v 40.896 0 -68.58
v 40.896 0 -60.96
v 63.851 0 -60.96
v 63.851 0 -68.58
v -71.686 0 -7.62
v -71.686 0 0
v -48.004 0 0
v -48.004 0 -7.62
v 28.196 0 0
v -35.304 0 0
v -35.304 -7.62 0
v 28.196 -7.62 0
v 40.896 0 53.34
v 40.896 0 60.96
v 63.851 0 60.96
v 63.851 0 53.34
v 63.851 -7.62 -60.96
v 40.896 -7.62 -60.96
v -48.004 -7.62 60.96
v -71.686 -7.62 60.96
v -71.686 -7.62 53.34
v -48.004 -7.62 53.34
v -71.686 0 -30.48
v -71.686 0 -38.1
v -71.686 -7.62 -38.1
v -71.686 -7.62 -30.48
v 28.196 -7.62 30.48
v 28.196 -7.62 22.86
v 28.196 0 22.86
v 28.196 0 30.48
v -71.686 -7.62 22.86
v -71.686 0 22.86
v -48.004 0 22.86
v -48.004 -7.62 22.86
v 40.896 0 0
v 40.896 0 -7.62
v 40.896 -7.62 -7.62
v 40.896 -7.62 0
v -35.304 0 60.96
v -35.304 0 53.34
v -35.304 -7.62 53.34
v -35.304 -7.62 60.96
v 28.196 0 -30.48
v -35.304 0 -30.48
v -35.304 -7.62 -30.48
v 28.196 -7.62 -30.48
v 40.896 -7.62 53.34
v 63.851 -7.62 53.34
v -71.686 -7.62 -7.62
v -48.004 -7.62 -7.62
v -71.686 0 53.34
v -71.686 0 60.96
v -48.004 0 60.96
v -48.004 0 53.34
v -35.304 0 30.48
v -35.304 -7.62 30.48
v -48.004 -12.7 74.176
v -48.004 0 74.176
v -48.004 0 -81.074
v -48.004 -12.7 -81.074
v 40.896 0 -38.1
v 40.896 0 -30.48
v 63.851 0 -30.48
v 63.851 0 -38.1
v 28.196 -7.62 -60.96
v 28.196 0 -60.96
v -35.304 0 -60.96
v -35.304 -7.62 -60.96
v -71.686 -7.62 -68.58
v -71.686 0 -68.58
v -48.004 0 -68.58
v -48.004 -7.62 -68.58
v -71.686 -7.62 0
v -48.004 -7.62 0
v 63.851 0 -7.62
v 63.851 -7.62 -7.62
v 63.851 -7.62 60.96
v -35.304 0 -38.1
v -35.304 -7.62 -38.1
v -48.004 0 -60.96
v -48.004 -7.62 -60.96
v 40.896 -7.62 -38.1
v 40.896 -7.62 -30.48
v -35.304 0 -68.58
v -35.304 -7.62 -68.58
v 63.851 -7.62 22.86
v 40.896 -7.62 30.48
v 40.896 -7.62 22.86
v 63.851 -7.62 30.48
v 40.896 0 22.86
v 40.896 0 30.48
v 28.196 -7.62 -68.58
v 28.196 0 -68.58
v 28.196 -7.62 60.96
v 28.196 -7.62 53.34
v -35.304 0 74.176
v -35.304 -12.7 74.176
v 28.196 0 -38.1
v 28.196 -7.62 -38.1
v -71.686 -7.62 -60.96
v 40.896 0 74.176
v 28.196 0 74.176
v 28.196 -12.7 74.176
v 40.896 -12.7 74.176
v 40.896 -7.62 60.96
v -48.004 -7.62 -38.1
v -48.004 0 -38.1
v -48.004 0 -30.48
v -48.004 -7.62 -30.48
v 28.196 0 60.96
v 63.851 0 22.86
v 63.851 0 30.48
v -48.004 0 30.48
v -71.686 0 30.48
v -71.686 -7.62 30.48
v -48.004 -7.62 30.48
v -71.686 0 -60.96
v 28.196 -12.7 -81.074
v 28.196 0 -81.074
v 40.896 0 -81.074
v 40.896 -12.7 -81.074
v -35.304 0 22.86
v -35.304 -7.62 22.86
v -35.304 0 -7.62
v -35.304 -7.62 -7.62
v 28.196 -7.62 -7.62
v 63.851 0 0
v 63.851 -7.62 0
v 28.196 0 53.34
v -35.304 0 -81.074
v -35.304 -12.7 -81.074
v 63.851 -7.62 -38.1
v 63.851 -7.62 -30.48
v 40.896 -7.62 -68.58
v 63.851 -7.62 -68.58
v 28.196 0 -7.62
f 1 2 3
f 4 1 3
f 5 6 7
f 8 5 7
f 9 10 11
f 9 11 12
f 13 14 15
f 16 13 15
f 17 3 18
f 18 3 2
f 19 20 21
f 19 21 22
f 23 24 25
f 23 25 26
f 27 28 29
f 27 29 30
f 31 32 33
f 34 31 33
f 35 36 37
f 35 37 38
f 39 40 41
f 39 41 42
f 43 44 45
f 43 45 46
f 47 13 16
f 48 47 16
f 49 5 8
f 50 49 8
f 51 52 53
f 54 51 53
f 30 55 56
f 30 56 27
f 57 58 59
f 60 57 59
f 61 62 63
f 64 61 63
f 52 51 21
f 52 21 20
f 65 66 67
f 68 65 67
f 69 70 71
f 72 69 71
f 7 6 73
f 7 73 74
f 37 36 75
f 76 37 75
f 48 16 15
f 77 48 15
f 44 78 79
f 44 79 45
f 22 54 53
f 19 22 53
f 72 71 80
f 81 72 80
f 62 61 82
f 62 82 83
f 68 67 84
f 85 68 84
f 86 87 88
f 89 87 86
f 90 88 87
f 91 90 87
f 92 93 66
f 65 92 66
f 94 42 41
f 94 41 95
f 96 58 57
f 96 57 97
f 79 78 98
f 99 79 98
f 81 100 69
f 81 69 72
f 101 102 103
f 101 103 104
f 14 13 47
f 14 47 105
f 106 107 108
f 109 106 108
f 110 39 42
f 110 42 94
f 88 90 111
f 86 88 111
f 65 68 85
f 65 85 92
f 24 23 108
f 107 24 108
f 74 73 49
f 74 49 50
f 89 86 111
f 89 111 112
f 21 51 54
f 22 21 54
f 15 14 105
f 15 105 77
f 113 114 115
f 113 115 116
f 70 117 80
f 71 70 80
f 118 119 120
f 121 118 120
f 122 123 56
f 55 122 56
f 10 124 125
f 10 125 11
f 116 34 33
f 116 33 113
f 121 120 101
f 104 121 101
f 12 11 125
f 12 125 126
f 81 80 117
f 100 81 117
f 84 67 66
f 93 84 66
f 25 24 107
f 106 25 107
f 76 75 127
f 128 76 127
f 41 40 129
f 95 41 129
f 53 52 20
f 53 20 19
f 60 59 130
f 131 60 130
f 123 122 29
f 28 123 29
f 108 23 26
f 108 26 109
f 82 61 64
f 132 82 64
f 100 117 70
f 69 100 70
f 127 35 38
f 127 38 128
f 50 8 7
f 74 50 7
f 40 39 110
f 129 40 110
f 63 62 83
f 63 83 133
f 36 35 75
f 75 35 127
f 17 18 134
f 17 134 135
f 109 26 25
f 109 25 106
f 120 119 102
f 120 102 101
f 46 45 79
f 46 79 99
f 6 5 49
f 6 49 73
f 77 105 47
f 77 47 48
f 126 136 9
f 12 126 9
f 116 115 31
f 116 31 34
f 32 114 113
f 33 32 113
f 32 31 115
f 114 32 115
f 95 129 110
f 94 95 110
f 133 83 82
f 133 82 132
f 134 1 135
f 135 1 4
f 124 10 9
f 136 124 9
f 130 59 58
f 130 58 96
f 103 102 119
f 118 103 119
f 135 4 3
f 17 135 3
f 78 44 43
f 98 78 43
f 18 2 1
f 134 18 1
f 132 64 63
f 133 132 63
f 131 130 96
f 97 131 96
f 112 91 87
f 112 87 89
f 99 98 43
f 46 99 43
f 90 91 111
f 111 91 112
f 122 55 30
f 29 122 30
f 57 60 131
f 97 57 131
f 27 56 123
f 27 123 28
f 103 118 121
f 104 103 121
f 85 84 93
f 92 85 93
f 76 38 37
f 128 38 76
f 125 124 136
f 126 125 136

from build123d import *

# Parameters (mm, degrees)
F0_W     = 12.7
F0_H     = 13.215657315
F0_H_2   = 22.86
F0_H_3   = 12.4944613409
F0_H_4   = 7.62
F1_DEPTH = 12.7
F0_W_2   = 23.6822664738
F2_DEPTH = 7.62
F0_W_3   = 63.5
F0_W_4   = 22.954866147


with BuildPart() as f1:
    # F0 (on Front) → F1 (new body)
    with BuildSketch(Plane.XZ):
        with Locations((-41.6535617948, 67.5678286575)):
            Rectangle(F0_W, F0_H)
        with Locations((-41.6535617948, 41.91)):
            Rectangle(F0_W, F0_H_2)
        with Locations((-41.6535617948, 11.43)):
            Rectangle(F0_W, F0_H_2)
        with Locations((-41.6535617948, -19.05)):
            Rectangle(F0_W, F0_H_2)
        with Locations((-41.6535617948, -49.53)):
            Rectangle(F0_W, F0_H_2)
        with Locations((-41.6535617948, -74.8272306705)):
            Rectangle(F0_W, F0_H_3)
        with Locations((-41.6535617948, 57.15)):
            Rectangle(F0_W, F0_H_4)
        Polygon((-35.3035617948, -68.58), (-35.3035617948, -67.4191057513), (-35.3035617948, -60.96), (-48.0035617948, -60.96), (-48.0035617948, -67.4191057513), (-48.0035617948, -68.58), align=None)
        with Locations((-41.6535617948, -34.29)):
            Rectangle(F0_W, F0_H_4)
        with Locations((-41.6535617948, -3.81)):
            Rectangle(F0_W, F0_H_4)
        with Locations((-41.6535617948, 26.67)):
            Rectangle(F0_W, F0_H_4)
    extrude(amount=F1_DEPTH)


with BuildPart() as f1b:
    # F0 (on Front) → F1, piece 2 (new body)
    with BuildSketch(Plane.XZ):
        with Locations((34.5464382052, 67.5678286575)):
            Rectangle(F0_W, F0_H)
        with Locations((34.5464382052, 41.91)):
            Rectangle(F0_W, F0_H_2)
        with Locations((34.5464382052, 11.43)):
            Rectangle(F0_W, F0_H_2)
        with Locations((34.5464382052, -19.05)):
            Rectangle(F0_W, F0_H_2)
        with Locations((34.5464382052, -49.53)):
            Rectangle(F0_W, F0_H_2)
        with Locations((34.5464382052, -74.8272306705)):
            Rectangle(F0_W, F0_H_3)
        with Locations((34.5464382052, 57.15)):
            Rectangle(F0_W, F0_H_4)
        with Locations((34.5464382052, 26.67)):
            Rectangle(F0_W, F0_H_4)
        with Locations((34.5464382052, -3.81)):
            Rectangle(F0_W, F0_H_4)
        with Locations((34.5464382052, -34.29)):
            Rectangle(F0_W, F0_H_4)
        Polygon((40.8964382052, -60.96), (28.1964382052, -60.96), (28.1964382052, -67.4191057513), (28.1964382052, -68.58), (40.8964382052, -68.58), (40.8964382052, -67.4191057513), align=None)
    extrude(amount=F1_DEPTH)


with BuildPart() as f2:
    # F0 (on Front) → F2 (new body)
    with BuildSketch(Plane.XZ):
        with Locations((-59.8446950316, 57.15)):
            Rectangle(F0_W_2, F0_H_4)
    extrude(amount=F2_DEPTH)


with BuildPart() as f2b:
    # F0 (on Front) → F2, piece 2 (new body)
    with BuildSketch(Plane.XZ):
        with Locations((-3.5535617948, 57.15)):
            Rectangle(F0_W_3, F0_H_4)
    extrude(amount=F2_DEPTH)


with BuildPart() as f2c:
    # F0 (on Front) → F2, piece 3 (new body)
    with BuildSketch(Plane.XZ):
        with Locations((-59.8446950316, 26.67)):
            Rectangle(F0_W_2, F0_H_4)
    extrude(amount=F2_DEPTH)


with BuildPart() as f2d:
    # F0 (on Front) → F2, piece 4 (new body)
    with BuildSketch(Plane.XZ):
        with Locations((-3.5535617948, 26.67)):
            Rectangle(F0_W_3, F0_H_4)
    extrude(amount=F2_DEPTH)


with BuildPart() as f2e:
    # F0 (on Front) → F2, piece 5 (new body)
    with BuildSketch(Plane.XZ):
        with Locations((-59.8446950316, -3.81)):
            Rectangle(F0_W_2, F0_H_4)
    extrude(amount=F2_DEPTH)


with BuildPart() as f2f:
    # F0 (on Front) → F2, piece 6 (new body)
    with BuildSketch(Plane.XZ):
        with Locations((-3.5535617948, -3.81)):
            Rectangle(F0_W_3, F0_H_4)
    extrude(amount=F2_DEPTH)


with BuildPart() as f2g:
    # F0 (on Front) → F2, piece 7 (new body)
    with BuildSketch(Plane.XZ):
        with Locations((-59.8446950316, -34.29)):
            Rectangle(F0_W_2, F0_H_4)
    extrude(amount=F2_DEPTH)


with BuildPart() as f2h:
    # F0 (on Front) → F2, piece 8 (new body)
    with BuildSketch(Plane.XZ):
        with Locations((-3.5535617948, -34.29)):
            Rectangle(F0_W_3, F0_H_4)
    extrude(amount=F2_DEPTH)


with BuildPart() as f2i:
    # F0 (on Front) → F2, piece 9 (new body)
    with BuildSketch(Plane.XZ):
        Polygon((-48.0035617948, -67.4191057513), (-48.0035617948, -60.96), (-71.6858282685, -60.96), (-71.6858282685, -68.58), (-48.0035617948, -68.58), align=None)
    extrude(amount=F2_DEPTH)


with BuildPart() as f2j:
    # F0 (on Front) → F2, piece 10 (new body)
    with BuildSketch(Plane.XZ):
        Polygon((-35.3035617948, -60.96), (-35.3035617948, -67.4191057513), (-35.3035617948, -68.58), (28.1964382052, -68.58), (28.1964382052, -67.4191057513), (28.1964382052, -60.96), align=None)
    extrude(amount=F2_DEPTH)


with BuildPart() as f2k:
    # F0 (on Front) → F2, piece 11 (new body)
    with BuildSketch(Plane.XZ):
        Polygon((63.8513043523, -60.96), (40.8964382052, -60.96), (40.8964382052, -67.4191057513), (40.8964382052, -68.58), (63.8513043523, -68.58), align=None)
    extrude(amount=F2_DEPTH)


with BuildPart() as f2l:
    # F0 (on Front) → F2, piece 12 (new body)
    with BuildSketch(Plane.XZ):
        with Locations((52.3738712788, -34.29)):
            Rectangle(F0_W_4, F0_H_4)
    extrude(amount=F2_DEPTH)


with BuildPart() as f2m:
    # F0 (on Front) → F2, piece 13 (new body)
    with BuildSketch(Plane.XZ):
        with Locations((52.3738712788, -3.81)):
            Rectangle(F0_W_4, F0_H_4)
    extrude(amount=F2_DEPTH)


with BuildPart() as f2n:
    # F0 (on Front) → F2, piece 14 (new body)
    with BuildSketch(Plane.XZ):
        with Locations((52.3738712788, 26.67)):
            Rectangle(F0_W_4, F0_H_4)
    extrude(amount=F2_DEPTH)


with BuildPart() as f2o:
    # F0 (on Front) → F2, piece 15 (new body)
    with BuildSketch(Plane.XZ):
        with Locations((52.3738712788, 57.15)):
            Rectangle(F0_W_4, F0_H_4)
    extrude(amount=F2_DEPTH)


solid = Compound([f1.part, f1b.part, f2.part, f2b.part, f2c.part, f2d.part, f2e.part, f2f.part, f2g.part, f2h.part, f2i.part, f2j.part, f2k.part, f2l.part, f2m.part, f2n.part, f2o.part])
